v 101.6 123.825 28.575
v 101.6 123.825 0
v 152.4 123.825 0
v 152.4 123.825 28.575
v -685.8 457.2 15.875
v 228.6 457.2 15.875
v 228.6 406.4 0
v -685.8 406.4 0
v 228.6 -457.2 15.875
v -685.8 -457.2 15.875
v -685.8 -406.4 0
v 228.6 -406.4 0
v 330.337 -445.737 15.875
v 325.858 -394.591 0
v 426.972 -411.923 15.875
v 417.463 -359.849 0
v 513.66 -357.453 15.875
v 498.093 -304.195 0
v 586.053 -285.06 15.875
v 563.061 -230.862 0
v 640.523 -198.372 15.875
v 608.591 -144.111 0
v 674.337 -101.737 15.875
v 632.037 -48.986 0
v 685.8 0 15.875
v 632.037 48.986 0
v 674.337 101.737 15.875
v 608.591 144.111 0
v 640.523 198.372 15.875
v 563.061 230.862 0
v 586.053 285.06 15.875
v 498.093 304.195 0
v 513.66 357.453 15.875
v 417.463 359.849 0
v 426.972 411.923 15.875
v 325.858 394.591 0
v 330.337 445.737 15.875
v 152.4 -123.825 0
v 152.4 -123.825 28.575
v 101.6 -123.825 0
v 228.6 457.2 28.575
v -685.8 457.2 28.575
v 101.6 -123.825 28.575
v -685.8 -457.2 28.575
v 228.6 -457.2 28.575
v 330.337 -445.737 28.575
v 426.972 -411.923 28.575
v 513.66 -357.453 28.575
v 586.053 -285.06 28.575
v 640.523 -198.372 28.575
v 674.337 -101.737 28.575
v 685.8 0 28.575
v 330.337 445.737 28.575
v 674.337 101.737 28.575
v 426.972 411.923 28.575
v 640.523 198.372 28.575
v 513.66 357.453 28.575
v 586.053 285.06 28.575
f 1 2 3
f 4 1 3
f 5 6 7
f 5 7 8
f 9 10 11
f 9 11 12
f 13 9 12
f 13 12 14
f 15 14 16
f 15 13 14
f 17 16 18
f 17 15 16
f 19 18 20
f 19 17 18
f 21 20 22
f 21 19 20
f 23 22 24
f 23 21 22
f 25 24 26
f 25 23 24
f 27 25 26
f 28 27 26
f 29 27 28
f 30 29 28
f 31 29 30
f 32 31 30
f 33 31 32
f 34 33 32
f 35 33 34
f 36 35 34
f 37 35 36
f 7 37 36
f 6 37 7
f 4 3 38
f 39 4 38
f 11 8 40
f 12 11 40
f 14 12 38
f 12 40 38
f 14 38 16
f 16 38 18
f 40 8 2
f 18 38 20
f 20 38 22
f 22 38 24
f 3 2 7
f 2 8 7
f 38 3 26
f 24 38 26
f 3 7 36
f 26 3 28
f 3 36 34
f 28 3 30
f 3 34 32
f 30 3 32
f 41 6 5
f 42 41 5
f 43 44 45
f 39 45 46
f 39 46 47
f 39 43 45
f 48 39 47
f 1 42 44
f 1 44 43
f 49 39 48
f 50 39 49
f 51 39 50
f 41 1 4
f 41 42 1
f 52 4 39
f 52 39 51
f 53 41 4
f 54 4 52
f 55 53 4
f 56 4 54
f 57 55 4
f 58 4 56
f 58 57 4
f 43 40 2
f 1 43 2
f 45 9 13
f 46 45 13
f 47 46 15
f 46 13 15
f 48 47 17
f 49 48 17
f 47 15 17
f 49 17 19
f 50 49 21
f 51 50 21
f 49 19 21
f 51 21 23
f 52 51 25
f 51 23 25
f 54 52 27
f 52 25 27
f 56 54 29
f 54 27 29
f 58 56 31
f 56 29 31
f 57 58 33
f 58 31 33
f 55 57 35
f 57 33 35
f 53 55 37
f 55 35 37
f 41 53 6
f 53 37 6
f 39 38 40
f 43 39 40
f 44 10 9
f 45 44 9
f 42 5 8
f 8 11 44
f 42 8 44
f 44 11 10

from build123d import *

# Parameters (mm, degrees)
F1_DEPTH = 28.575
F2_SIZE2 = 15.875
F2_SIZE  = 50.8


with BuildPart() as f1:
    # F0 (on Top) → F1 (new body)
    with BuildSketch(Plane.XY):
        with BuildLine():
            Line((228.6, 457.2), (-685.8, 457.2))
            Line((-685.8, 457.2), (-685.8, -457.2))
            Line((-685.8, -457.2), (228.6, -457.2))
            ThreePointArc((228.6, -457.2), (551.8892203585, -323.2892203585), (685.8, 0))
            ThreePointArc((685.8, 0), (551.8892203585, 323.2892203585), (228.6, 457.2))
        make_face()
        Polygon((152.4, 123.825), (152.4, 0), (152.4, -123.825), (101.6, -123.825), (101.6, 123.825), align=None, mode=Mode.SUBTRACT)
    extrude(amount=F1_DEPTH)

    # F2
    f2_edges = [f1.edges().sort_by_distance(p)[0] for p in [
        (-228.6, 457.2, 0),
        (685.8, 0, 0),
        (-228.6, -457.2, 0),
    ]]
    f2_side = f1.faces().sort_by_distance((-46.847704, 0, 0))[0]
    chamfer(f2_edges, length=F2_SIZE, length2=F2_SIZE2, reference=f2_side)


solid = f1.part
